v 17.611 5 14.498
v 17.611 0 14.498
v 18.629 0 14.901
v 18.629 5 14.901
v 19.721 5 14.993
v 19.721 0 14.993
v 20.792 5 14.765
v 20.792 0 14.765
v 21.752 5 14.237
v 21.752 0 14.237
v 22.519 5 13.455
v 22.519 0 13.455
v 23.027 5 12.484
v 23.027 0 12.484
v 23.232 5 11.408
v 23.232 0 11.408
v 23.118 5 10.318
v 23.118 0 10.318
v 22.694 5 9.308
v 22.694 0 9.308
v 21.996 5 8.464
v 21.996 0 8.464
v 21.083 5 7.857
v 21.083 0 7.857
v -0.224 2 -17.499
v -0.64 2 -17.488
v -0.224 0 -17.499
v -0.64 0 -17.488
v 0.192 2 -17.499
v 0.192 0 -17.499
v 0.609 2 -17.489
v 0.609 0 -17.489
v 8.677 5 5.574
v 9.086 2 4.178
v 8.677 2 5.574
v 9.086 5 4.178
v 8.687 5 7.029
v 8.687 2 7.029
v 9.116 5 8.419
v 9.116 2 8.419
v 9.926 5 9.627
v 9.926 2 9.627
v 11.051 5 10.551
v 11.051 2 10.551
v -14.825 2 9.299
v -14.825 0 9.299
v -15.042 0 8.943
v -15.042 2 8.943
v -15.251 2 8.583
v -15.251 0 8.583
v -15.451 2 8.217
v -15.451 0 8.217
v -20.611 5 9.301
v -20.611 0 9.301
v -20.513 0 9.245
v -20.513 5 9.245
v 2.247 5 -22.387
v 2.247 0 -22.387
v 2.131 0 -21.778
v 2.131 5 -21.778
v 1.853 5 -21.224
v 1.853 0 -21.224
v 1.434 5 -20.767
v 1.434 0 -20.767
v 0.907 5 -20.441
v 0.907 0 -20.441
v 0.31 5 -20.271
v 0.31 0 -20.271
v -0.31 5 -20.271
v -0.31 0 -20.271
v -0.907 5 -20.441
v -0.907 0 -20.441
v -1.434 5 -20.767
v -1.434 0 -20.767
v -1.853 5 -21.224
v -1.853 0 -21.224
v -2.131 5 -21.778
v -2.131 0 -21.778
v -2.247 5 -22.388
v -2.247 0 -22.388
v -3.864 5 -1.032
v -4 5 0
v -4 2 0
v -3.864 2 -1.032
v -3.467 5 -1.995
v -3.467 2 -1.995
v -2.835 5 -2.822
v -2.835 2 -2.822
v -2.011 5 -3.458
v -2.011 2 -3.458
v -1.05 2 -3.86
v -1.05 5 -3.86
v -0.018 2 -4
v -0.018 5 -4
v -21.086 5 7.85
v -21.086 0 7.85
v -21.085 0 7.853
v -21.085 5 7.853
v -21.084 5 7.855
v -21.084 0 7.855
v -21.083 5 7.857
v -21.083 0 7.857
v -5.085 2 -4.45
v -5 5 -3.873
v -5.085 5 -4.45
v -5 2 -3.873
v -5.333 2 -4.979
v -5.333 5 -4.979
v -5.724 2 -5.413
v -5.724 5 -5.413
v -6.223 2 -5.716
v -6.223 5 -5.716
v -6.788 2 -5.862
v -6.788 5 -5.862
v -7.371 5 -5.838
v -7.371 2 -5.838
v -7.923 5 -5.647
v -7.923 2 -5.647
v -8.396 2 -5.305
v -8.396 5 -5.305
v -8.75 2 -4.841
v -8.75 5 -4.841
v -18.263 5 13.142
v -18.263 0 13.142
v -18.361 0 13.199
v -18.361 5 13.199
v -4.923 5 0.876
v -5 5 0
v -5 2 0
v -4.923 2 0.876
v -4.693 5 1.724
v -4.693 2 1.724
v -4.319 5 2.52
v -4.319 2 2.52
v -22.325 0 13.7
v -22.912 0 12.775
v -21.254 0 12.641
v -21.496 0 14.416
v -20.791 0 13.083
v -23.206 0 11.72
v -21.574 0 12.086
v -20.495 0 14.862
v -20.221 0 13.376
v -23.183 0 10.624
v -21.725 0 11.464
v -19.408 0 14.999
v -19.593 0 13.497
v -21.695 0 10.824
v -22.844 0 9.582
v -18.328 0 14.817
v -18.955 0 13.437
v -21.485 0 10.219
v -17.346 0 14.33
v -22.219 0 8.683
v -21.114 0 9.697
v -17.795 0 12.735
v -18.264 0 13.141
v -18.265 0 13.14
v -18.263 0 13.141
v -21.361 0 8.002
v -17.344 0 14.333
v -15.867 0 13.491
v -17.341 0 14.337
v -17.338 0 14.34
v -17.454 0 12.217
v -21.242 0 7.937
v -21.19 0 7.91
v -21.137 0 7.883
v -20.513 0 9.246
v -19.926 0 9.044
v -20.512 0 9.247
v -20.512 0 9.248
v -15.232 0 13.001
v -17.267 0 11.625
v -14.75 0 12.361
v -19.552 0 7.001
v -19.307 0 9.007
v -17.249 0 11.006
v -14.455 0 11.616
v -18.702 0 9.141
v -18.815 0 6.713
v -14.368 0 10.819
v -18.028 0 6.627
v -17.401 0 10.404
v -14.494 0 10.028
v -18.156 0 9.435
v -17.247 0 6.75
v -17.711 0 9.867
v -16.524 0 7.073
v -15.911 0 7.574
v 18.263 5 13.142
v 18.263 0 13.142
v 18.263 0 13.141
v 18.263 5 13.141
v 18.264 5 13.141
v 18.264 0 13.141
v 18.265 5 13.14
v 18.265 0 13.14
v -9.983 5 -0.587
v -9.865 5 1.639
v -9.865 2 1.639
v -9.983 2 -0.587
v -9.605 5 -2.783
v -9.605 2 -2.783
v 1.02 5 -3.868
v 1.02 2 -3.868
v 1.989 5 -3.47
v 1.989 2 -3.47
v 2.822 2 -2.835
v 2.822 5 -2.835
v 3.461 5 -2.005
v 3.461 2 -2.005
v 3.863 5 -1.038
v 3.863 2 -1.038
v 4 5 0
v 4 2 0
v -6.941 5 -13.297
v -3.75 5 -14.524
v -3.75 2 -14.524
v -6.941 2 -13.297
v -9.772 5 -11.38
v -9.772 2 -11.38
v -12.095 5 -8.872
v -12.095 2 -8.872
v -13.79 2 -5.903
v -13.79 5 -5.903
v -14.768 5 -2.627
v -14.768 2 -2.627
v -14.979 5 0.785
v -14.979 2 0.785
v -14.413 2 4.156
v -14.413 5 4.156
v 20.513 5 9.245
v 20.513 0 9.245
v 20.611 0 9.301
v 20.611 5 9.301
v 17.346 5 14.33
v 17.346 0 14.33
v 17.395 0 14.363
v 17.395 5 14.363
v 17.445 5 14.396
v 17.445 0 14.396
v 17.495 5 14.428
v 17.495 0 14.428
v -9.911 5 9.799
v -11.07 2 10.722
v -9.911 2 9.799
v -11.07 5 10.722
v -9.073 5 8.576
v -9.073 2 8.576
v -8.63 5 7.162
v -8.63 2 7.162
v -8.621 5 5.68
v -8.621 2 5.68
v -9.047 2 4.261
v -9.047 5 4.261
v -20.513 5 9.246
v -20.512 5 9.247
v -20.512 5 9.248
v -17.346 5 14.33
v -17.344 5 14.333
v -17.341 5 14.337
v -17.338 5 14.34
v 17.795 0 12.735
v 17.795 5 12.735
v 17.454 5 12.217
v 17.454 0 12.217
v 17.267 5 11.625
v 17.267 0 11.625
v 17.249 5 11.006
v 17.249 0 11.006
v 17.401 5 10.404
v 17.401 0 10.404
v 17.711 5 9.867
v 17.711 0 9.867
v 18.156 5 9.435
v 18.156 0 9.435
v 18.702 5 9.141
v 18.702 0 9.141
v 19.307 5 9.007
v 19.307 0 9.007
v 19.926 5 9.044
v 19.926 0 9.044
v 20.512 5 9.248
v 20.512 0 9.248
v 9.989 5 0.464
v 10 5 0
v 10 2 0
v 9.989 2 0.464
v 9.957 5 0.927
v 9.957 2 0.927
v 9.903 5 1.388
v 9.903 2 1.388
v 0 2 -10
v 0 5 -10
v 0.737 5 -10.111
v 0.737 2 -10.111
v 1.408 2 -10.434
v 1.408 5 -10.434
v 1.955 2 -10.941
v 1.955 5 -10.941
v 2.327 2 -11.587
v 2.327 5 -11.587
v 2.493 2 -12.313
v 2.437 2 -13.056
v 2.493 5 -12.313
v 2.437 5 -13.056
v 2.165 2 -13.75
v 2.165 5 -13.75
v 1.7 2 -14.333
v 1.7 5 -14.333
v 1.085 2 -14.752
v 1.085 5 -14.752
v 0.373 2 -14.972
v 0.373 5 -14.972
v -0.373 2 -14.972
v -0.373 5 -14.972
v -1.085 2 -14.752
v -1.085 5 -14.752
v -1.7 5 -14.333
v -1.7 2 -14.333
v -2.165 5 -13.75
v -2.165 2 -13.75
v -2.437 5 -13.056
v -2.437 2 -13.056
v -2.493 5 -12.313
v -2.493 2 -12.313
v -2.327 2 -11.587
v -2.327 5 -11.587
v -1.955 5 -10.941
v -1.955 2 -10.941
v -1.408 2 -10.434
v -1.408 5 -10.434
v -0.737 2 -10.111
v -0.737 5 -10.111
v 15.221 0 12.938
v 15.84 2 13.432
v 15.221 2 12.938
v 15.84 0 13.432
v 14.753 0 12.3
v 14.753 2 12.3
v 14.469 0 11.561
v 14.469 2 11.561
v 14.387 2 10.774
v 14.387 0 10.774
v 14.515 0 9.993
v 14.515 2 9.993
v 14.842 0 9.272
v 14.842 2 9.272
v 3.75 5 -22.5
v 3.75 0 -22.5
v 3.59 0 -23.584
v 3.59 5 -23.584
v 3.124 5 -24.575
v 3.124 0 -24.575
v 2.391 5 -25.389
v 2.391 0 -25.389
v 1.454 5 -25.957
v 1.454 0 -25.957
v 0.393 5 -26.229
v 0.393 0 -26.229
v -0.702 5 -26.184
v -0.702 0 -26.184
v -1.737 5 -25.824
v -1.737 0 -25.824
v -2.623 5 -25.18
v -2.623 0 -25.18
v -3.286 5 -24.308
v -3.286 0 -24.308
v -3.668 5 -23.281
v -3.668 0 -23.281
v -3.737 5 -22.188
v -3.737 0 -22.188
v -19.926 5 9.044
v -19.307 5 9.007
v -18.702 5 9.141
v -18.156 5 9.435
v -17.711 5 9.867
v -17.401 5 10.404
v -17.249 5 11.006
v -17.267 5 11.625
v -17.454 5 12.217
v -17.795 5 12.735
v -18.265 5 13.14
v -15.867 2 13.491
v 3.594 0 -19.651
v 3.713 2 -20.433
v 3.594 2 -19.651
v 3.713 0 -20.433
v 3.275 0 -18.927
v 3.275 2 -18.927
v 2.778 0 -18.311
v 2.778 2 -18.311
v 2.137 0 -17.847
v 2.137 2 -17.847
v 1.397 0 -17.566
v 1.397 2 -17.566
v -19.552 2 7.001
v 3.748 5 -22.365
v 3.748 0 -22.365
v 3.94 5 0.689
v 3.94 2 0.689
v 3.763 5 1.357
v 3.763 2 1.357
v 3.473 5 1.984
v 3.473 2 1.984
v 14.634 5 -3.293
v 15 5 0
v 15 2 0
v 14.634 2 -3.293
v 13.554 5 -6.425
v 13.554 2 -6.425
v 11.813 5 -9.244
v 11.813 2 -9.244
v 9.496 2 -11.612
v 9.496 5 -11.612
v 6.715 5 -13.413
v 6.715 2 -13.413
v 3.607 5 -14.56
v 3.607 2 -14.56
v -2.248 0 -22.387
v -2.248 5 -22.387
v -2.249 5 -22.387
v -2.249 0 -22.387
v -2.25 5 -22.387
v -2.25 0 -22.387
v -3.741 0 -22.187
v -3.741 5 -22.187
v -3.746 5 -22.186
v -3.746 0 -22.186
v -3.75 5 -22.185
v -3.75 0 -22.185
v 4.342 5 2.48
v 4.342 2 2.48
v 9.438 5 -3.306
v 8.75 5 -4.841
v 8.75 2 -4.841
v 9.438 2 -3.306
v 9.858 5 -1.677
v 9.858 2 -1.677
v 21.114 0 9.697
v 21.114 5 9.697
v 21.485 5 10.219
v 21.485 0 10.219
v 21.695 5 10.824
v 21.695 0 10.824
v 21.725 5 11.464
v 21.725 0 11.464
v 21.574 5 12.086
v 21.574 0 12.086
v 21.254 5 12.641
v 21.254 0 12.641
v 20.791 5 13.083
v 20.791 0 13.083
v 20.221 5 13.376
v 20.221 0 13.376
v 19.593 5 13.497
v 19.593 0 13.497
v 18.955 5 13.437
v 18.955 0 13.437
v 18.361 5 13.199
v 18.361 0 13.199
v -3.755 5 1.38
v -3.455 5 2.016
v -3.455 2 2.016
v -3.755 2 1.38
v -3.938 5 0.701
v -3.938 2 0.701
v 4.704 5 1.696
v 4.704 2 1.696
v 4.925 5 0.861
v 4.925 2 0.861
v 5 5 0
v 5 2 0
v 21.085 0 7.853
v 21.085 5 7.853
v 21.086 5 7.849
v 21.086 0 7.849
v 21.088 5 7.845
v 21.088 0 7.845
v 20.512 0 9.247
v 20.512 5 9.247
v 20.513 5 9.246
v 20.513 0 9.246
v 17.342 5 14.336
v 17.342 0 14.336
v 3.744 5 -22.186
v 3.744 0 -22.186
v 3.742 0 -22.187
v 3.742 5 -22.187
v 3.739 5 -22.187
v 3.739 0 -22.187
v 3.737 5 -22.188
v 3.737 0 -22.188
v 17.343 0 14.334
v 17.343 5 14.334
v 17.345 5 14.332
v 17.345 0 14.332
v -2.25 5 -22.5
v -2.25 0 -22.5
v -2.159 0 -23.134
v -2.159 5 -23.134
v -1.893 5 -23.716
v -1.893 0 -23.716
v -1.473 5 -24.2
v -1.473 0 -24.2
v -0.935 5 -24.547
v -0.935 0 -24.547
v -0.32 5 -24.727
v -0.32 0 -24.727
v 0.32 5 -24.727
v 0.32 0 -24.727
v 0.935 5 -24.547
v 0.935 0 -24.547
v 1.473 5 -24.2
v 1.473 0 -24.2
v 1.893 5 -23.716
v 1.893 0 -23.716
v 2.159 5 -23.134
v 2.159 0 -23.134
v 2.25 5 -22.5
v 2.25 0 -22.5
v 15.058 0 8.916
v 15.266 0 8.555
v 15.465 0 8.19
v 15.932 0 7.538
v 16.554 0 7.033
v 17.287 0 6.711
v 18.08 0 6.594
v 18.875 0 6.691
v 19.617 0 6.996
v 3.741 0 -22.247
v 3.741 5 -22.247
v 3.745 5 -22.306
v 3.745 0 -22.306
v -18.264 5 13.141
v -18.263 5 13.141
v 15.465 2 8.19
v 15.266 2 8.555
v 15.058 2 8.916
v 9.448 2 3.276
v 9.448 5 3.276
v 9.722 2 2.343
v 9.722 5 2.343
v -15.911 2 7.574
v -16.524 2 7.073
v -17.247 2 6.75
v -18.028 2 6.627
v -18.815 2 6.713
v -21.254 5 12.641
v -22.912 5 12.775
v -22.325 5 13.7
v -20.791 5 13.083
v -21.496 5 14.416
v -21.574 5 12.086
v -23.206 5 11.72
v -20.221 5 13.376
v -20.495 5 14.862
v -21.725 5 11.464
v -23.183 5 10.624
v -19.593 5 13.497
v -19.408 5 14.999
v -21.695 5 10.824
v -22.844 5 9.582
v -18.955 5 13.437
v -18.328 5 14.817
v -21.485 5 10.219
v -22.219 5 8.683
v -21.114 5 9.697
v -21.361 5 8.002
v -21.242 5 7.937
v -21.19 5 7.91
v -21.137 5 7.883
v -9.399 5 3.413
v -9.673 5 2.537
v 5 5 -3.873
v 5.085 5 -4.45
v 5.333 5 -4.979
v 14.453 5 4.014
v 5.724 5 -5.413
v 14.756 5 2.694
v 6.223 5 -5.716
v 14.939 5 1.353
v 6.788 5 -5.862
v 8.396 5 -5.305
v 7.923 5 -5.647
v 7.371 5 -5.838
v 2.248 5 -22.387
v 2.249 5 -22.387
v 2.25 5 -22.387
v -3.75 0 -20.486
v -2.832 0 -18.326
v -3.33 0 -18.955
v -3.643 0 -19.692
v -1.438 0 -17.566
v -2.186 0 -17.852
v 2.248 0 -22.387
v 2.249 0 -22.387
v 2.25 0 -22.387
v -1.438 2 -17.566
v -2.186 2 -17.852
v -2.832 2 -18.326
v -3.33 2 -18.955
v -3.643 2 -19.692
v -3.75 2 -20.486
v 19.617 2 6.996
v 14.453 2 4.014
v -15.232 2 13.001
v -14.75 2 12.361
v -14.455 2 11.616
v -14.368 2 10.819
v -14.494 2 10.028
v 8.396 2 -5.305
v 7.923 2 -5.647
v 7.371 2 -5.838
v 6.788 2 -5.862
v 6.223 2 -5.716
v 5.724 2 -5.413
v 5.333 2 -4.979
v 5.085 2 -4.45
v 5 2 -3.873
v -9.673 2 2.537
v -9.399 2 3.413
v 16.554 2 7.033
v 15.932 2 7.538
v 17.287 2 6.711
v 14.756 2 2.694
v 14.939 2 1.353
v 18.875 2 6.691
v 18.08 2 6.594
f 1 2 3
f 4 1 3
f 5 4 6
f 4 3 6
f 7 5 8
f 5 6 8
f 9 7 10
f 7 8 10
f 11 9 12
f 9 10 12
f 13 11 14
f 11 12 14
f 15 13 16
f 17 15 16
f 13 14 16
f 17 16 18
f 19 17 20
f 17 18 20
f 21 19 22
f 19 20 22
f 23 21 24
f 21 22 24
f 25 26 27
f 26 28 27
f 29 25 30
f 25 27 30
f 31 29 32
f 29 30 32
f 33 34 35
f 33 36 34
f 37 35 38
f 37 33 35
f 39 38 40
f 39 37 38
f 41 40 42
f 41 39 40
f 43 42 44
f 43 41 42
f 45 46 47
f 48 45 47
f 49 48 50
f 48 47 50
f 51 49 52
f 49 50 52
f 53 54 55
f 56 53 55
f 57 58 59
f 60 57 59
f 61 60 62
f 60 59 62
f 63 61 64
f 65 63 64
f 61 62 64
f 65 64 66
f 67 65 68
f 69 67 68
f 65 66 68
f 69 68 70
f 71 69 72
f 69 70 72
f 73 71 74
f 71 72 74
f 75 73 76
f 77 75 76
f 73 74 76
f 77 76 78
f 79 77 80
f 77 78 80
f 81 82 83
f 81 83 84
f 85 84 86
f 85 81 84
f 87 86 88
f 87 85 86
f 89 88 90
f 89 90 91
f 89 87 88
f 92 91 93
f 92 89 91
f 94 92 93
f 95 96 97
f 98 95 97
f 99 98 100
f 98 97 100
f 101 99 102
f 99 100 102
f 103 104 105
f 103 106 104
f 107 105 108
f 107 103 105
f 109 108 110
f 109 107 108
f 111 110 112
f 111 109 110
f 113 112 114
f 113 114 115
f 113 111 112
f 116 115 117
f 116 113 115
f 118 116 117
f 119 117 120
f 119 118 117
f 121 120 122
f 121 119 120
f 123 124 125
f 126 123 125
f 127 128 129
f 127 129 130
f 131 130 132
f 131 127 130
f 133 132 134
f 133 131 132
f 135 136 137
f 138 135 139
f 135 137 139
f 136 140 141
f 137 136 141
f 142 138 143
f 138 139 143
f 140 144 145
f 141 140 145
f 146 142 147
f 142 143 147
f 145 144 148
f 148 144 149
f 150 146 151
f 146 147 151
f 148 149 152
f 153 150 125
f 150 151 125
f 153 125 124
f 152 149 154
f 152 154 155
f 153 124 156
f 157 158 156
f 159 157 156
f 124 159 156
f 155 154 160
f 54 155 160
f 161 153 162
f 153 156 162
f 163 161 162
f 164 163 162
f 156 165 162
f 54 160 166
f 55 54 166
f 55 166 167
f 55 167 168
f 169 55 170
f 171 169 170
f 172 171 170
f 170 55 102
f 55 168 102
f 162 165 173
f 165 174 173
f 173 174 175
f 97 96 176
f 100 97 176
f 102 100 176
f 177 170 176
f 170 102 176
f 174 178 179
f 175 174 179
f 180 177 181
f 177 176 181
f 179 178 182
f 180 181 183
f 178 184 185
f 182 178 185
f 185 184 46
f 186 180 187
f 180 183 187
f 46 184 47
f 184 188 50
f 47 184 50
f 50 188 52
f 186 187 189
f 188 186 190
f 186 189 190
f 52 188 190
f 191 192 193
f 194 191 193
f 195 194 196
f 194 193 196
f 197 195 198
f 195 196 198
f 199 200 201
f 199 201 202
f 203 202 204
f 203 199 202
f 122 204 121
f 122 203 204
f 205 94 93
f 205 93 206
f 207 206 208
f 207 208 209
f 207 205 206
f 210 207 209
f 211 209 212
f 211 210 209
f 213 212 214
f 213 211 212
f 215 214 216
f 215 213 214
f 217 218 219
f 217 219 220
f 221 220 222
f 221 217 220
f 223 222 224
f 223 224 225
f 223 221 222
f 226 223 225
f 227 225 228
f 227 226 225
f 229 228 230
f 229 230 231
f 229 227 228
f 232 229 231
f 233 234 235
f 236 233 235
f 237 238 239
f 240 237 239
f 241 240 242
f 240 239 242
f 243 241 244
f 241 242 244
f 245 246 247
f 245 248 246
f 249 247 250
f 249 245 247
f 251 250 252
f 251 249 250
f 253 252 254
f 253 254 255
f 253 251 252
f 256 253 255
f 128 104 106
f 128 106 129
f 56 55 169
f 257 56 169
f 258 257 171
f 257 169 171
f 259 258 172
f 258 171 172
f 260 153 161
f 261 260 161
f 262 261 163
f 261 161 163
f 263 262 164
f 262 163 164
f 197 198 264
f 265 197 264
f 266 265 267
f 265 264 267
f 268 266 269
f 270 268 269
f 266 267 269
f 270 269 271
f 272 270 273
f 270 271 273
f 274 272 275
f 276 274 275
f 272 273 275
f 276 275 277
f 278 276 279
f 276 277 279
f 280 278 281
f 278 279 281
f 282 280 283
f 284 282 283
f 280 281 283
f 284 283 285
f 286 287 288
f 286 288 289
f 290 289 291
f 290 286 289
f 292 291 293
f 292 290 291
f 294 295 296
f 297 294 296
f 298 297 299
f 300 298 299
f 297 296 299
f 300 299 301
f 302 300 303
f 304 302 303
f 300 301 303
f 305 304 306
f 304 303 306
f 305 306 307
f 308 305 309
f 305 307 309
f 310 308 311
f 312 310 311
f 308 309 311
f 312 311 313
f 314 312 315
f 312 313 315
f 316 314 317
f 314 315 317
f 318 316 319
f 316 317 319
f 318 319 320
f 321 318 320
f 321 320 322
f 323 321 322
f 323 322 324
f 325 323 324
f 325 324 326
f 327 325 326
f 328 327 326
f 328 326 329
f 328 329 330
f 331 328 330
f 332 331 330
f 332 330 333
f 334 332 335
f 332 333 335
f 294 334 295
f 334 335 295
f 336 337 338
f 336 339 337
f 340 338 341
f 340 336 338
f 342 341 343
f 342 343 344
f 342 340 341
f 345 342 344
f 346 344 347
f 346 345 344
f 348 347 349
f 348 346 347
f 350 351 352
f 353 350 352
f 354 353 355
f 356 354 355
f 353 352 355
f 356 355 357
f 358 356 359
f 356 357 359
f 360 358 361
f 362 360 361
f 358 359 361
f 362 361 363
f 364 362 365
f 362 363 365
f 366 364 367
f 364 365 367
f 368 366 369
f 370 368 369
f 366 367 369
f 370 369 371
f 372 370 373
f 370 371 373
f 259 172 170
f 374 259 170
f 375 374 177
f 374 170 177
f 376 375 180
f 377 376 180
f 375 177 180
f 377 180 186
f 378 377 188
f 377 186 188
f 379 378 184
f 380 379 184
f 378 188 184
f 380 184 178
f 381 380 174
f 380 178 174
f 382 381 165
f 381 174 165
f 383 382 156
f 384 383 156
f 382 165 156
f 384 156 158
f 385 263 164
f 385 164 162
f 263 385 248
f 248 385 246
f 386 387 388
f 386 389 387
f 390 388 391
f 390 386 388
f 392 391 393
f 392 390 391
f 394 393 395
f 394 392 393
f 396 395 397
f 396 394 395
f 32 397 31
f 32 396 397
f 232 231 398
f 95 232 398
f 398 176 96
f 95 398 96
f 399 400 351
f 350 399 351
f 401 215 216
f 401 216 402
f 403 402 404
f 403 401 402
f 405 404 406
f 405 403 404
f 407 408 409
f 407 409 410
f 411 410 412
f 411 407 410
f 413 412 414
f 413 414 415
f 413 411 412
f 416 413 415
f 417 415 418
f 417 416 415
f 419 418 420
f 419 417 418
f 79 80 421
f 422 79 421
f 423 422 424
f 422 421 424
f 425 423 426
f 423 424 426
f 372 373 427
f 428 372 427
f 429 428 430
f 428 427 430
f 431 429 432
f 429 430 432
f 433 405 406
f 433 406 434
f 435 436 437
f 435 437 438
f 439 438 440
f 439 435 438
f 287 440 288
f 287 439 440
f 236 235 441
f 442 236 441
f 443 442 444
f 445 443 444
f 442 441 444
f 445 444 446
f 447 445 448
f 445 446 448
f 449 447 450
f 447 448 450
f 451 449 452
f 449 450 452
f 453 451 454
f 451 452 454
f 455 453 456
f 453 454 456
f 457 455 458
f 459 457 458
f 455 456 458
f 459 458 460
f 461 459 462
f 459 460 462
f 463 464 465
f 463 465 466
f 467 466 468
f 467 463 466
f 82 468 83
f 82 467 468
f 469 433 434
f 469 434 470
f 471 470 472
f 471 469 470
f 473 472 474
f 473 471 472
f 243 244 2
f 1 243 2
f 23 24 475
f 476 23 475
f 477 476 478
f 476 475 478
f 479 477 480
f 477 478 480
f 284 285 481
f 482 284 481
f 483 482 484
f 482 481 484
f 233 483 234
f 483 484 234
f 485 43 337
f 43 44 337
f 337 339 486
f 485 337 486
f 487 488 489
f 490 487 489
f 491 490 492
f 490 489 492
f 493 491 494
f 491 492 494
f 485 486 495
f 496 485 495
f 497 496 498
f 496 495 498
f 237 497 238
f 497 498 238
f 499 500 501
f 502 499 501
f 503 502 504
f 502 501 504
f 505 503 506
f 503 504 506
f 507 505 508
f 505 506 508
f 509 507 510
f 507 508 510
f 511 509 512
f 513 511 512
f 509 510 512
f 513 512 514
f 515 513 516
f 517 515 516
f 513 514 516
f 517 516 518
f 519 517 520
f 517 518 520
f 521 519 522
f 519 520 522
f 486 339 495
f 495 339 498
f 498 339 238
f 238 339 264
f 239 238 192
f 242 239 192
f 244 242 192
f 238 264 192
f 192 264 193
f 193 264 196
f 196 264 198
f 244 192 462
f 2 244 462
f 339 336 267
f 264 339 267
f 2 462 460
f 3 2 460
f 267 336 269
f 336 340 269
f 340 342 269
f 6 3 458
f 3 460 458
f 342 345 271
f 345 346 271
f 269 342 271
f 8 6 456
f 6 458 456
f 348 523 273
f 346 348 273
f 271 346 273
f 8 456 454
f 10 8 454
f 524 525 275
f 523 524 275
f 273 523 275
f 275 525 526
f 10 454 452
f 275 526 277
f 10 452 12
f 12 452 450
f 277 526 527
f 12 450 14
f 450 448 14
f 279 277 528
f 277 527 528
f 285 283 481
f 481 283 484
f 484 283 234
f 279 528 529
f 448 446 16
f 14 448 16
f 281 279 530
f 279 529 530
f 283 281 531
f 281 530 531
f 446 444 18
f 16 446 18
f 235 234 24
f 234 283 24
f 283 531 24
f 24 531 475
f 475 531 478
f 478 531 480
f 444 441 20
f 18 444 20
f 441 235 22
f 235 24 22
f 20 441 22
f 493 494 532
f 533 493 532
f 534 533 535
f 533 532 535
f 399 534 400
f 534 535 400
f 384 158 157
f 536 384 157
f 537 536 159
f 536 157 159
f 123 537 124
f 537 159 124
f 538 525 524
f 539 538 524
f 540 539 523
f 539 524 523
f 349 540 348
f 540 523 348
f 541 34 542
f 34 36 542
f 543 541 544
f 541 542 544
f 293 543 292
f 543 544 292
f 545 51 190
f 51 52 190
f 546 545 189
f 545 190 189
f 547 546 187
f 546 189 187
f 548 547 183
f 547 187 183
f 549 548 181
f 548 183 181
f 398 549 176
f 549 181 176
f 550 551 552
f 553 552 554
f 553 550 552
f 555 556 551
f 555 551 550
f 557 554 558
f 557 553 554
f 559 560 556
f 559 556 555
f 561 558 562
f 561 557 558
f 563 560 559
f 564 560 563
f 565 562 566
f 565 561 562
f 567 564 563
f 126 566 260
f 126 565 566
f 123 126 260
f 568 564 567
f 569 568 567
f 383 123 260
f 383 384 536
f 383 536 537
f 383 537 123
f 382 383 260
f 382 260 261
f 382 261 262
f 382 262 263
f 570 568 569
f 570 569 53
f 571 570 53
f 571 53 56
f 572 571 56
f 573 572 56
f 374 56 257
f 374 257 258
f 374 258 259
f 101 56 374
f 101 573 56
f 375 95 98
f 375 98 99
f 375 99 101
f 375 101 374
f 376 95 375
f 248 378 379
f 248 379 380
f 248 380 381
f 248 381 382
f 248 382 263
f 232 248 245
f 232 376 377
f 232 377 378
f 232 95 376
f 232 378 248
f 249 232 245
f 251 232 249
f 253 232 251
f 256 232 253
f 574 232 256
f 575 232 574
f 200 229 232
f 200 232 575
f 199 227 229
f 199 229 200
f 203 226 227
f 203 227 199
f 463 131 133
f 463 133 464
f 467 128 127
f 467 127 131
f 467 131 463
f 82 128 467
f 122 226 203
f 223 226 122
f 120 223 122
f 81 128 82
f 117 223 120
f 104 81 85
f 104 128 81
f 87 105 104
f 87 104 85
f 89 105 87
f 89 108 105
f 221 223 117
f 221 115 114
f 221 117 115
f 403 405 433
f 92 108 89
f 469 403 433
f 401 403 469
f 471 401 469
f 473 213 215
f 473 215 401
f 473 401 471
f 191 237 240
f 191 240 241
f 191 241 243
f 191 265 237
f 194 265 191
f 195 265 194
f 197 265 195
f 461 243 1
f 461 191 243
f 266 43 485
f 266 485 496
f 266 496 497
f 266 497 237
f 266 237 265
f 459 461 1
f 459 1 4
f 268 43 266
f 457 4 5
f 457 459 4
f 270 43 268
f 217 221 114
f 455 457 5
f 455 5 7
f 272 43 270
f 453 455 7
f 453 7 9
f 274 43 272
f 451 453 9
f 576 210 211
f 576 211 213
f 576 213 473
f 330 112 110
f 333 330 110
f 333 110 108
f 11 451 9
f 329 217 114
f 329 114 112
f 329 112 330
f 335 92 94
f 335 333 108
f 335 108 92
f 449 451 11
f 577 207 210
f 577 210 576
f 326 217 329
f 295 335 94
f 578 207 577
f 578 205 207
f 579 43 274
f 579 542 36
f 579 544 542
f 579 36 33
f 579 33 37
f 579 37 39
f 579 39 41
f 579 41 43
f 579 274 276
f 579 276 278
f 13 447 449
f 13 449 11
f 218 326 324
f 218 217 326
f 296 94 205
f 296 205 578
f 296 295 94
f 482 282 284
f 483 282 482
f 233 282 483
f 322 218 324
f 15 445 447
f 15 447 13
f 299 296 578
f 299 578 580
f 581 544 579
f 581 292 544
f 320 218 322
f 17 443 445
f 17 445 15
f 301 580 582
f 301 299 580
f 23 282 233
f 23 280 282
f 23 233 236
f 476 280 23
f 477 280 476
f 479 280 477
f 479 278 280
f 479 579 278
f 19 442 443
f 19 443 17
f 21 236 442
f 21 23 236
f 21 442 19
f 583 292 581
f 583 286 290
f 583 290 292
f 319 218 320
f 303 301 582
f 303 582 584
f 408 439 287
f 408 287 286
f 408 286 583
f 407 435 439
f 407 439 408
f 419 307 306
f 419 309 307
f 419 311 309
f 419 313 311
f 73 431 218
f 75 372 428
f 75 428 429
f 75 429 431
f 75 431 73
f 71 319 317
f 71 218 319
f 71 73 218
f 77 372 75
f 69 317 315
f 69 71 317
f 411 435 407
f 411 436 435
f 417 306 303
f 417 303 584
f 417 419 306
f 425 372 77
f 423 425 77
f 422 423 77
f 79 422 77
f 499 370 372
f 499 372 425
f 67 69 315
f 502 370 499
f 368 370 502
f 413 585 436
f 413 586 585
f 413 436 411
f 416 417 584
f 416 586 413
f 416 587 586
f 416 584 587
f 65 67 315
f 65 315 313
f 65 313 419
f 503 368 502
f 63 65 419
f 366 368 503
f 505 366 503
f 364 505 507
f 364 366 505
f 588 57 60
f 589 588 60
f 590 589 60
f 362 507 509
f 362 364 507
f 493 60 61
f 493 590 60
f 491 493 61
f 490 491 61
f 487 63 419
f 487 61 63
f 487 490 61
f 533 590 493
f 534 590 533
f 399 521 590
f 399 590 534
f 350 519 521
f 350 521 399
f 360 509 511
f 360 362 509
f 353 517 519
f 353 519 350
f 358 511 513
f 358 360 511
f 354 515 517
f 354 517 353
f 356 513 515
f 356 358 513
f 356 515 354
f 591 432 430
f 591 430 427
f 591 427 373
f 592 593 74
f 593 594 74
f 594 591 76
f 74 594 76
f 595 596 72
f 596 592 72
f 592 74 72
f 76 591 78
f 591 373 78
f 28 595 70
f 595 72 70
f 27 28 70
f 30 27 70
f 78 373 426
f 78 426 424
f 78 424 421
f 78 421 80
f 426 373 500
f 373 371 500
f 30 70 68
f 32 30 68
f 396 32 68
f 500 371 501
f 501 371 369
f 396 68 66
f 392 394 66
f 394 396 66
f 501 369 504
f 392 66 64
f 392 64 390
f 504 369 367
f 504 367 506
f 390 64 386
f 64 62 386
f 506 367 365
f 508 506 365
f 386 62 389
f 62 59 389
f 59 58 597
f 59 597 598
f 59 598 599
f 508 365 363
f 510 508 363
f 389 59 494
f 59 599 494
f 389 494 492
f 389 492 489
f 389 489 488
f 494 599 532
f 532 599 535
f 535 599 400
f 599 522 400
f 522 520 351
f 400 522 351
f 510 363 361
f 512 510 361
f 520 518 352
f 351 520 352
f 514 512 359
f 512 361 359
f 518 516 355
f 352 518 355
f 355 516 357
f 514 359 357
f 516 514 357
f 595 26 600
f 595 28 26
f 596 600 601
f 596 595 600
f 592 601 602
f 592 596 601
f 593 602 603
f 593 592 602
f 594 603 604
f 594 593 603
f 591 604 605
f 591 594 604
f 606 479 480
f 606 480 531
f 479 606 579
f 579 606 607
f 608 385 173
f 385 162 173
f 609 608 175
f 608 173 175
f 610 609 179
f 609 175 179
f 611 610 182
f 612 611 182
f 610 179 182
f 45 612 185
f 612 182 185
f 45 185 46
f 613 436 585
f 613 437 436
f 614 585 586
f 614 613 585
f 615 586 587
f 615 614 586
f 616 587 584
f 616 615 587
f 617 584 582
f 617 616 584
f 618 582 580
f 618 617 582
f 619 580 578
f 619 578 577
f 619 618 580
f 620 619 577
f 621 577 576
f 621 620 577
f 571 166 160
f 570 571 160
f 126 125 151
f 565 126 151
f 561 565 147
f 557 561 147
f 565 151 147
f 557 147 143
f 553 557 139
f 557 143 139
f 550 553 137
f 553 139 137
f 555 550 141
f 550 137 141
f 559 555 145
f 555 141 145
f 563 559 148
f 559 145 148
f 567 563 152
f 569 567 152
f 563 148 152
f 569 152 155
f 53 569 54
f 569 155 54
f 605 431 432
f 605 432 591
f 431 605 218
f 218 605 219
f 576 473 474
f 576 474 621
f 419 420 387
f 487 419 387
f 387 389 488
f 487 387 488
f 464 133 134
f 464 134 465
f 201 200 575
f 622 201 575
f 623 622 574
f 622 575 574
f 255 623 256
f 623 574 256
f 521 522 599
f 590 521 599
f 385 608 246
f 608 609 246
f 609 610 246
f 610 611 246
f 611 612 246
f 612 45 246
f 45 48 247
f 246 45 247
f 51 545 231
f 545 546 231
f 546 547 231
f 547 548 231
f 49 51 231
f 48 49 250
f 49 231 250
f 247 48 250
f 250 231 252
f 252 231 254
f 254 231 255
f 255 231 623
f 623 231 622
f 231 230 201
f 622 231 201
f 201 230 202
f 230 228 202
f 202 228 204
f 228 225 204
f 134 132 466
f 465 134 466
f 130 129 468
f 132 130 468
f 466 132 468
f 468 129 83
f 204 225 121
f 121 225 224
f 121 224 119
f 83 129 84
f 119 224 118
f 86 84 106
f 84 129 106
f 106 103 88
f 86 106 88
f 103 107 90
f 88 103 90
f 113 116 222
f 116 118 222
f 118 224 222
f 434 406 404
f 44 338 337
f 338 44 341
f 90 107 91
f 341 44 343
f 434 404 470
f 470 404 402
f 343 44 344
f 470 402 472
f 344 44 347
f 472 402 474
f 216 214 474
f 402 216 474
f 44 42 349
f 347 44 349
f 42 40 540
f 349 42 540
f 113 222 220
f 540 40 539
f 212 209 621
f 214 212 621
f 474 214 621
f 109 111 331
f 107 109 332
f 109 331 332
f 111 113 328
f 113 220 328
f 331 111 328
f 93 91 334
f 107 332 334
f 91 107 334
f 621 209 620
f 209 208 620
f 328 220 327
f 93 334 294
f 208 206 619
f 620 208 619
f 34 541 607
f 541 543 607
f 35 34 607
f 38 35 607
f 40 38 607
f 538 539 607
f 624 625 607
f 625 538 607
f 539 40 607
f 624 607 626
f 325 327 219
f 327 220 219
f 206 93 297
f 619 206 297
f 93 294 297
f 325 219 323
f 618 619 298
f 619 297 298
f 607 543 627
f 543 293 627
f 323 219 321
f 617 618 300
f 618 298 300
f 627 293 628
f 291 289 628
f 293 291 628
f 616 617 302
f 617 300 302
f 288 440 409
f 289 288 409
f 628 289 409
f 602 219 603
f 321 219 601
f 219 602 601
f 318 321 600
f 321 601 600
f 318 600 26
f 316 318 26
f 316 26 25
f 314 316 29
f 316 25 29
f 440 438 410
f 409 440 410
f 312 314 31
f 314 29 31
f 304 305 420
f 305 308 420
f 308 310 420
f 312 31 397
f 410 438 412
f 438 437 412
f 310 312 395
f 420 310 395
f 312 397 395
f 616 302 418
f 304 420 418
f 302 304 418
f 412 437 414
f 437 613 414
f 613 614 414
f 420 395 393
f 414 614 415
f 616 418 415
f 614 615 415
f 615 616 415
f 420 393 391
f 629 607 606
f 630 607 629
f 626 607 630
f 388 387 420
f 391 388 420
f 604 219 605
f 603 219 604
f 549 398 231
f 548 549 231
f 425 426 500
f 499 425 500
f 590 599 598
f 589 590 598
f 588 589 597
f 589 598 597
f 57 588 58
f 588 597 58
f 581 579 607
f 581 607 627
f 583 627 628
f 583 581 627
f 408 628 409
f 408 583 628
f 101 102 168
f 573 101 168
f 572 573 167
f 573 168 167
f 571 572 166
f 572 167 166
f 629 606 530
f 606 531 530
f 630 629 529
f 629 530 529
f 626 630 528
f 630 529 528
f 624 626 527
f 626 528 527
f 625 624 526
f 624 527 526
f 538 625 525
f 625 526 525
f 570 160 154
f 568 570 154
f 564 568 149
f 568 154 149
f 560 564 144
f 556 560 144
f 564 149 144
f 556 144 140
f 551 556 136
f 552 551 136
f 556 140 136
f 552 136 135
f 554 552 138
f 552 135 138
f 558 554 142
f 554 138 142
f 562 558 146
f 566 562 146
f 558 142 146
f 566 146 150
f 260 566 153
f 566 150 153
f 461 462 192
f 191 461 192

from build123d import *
from build123d.topology import SkipClean

# Parameters (mm, degrees)
EXTRUDE_1_DEPTH     = 5
SKETCH_2_R          = 17.5
CUT_EXTRUDE_1_DEPTH = 2
FILLET_1_R          = 3
EXTRUDE_2_DEPTH     = 3
SKETCH_4_R          = 10
CUT_EXTRUDE_2_DEPTH = 3
FILLET_2_R          = 5
EXTRUDE_3_DEPTH     = 3
FILLET_3_R          = 2
SKETCH_6_R          = 2.5
CUT_EXTRUDE_3_DEPTH = 3


with BuildPart() as part:
    # 草图1 → 凸台-拉伸1 (new body)
    with BuildSketch(Plane(origin=(0, 0, 0), x_dir=(1, 0, 0), z_dir=(0, 1, 0))):
        with BuildLine():
            Line((-17.338032686, -14.340244858), (0.36317955, -4.120445208))
            Line((0.36317955, -4.120445208), (17.341691759, -14.335819716))
            ThreePointArc((17.341691759, -14.335819716), (17.344076322, -14.33293468), (17.346460405, -14.330049246))
            ThreePointArc((17.346460405, -14.330049246), (17.419960834, -14.379816644), (17.494618607, -14.42783043))
            Line((17.494618607, -14.42783043), (17.610571585, -14.497595264))
            ThreePointArc((17.610571585, -14.497595264), (22.80853464, -12.987934561), (21.083416888, -7.857450754))
            ThreePointArc((21.083416888, -7.857450754), (21.085725698, -7.851252881), (21.088032686, -7.845054329))
            Line((21.088032686, -7.845054329), (3.38682045, 2.374745321))
            Line((3.38682045, 2.374745321), (3.744338179, 22.186255466))
            ThreePointArc((3.744338179, 22.186255466), (3.740647382, 22.18687804), (3.736956482, 22.1875))
            ThreePointArc((3.736956482, 22.1875), (3.743306098, 22.276036937), (3.74755837, 22.364699358))
            Line((3.74755837, 22.364699358), (3.75, 22.5))
            ThreePointArc((3.75, 22.5), (-0.156386047, 26.246737702), (-3.736956482, 22.1875))
            ThreePointArc((-3.736956482, 22.1875), (-3.743478403, 22.186400552), (-3.75, 22.185299187))
            Line((-3.75, 22.185299187), (-3.75, 1.745699887))
            Line((-3.75, 1.745699887), (-21.086029938, -7.85043575))
            ThreePointArc((-21.086029938, -7.85043575), (-21.084723704, -7.85394336), (-21.083416888, -7.857450754))
            ThreePointArc((-21.083416888, -7.857450754), (-21.163266932, -7.896220293), (-21.242176977, -7.936868928))
            Line((-21.242176977, -7.936868928), (-21.360571585, -8.002404736))
            ThreePointArc((-21.360571585, -8.002404736), (-22.652148592, -13.258803141), (-17.346460405, -14.330049246))
            ThreePointArc((-17.346460405, -14.330049246), (-17.342247295, -14.335147671), (-17.338032686, -14.340244858))
        make_face()
        with BuildLine():
            ThreePointArc((-18.264550857, -13.139869938), (-18.263724931, -13.141017908), (-18.262898932, -13.142165826))
            Line((-18.262898932, -13.142165826), (-18.360571585, -13.198557159))
            ThreePointArc((-18.360571585, -13.198557159), (-21.434128744, -12.375), (-20.610571585, -9.301442841))
            Line((-20.610571585, -9.301442841), (-20.512898932, -9.245051509))
            ThreePointArc((-20.512898932, -9.245051509), (-20.512317805, -9.246340804), (-20.511736597, -9.247630062))
            ThreePointArc((-20.511736597, -9.247630062), (-17.537014427, -10.125), (-18.264550857, -13.139869938))
        make_face(mode=Mode.SUBTRACT)
        with BuildLine():
            ThreePointArc((20.511736597, -9.247630062), (20.512317805, -9.246340804), (20.512898932, -9.245051509))
            Line((20.512898932, -9.245051509), (20.610571585, -9.301442841))
            ThreePointArc((20.610571585, -9.301442841), (21.434128744, -12.375), (18.360571585, -13.198557159))
            Line((18.360571585, -13.198557159), (18.262898932, -13.142165826))
            ThreePointArc((18.262898932, -13.142165826), (18.263724931, -13.141017908), (18.264550857, -13.139869938))
            ThreePointArc((18.264550857, -13.139869938), (17.537014427, -10.125), (20.511736597, -9.247630062))
        make_face(mode=Mode.SUBTRACT)
        with BuildLine():
            Line((-2.25, 22.387217335), (-2.25, 22.5))
            ThreePointArc((-2.25, 22.5), (0, 24.75), (2.25, 22.5))
            Line((2.25, 22.5), (2.25, 22.387217335))
            ThreePointArc((2.25, 22.387217335), (2.248592874, 22.387358712), (2.24718574, 22.3875))
            ThreePointArc((2.24718574, 22.3875), (0, 20.25), (-2.24718574, 22.3875))
            ThreePointArc((-2.24718574, 22.3875), (-2.248592874, 22.387358712), (-2.25, 22.387217335))
        make_face(mode=Mode.SUBTRACT)
    extrude(amount=EXTRUDE_1_DEPTH)

    # 草图2 → 切除-拉伸1 (cut)
    with BuildSketch(Plane.XZ):
        Circle(SKETCH_2_R)
    extrude(amount=-CUT_EXTRUDE_1_DEPTH, mode=Mode.SUBTRACT)

    # 圆角1
    fillet_1_edges = [part.edges().sort_by_distance(p)[0] for p in [
        (-12.928399103, 1, 11.794341721),
        (12.995206069, 1, 11.720691926),
        (16.678399103, 1, 5.299151193),
        (3.652813923, 1, -17.114524546),
        (-3.75, 1, -17.093492914),
        (-16.648019992, 1, 5.393832621),
    ]]
    fillet(fillet_1_edges, radius=FILLET_1_R)

    # 草图3 → 凸台-拉伸2 (add)
    with BuildSketch(Plane(origin=(0, 5, 0), x_dir=(1, 0, 0), z_dir=(0, 1, 0))):
        with BuildLine():
            Line((9.903270362, -1.38752879), (14.452882373, -4.01424851))
            ThreePointArc((14.452882373, -4.01424851), (14.862591221, -2.025680676), (15, 0))
            ThreePointArc((15, 0), (11.813143266, 9.24389778), (3.606713844, 14.559931842))
            Line((3.606713844, 14.559931842), (3.512924046, 9.362657991))
            ThreePointArc((3.512924046, 9.362657991), (8.219770084, 5.695206737), (10, 0))
            ThreePointArc((10, 0), (9.97578828, -0.695448195), (9.903270362, -1.38752879))
        make_face()
        with BuildLine():
            ThreePointArc((-3.75, 14.523687548), (-13.027173179, 7.435910097), (-14.412627775, -4.156460108))
            Line((-14.412627775, -4.156460108), (-9.86476169, -1.63904753))
            ThreePointArc((-9.86476169, -1.63904753), (-8.723165526, 4.889415425), (-3.75, 9.270248109))
            Line((-3.75, 9.270248109), (-3.75, 14.523687548))
        make_face()
    extrude(amount=-EXTRUDE_2_DEPTH)

    # 草图4 → 切除-拉伸2 (cut)
    with SkipClean():  # the faces are left unmerged after this step: merging them gives an invalid solid
        with BuildSketch(Plane(origin=(0, 5, 0), x_dir=(1, 0, 0), z_dir=(0, 1, 0))):
            Circle(SKETCH_4_R)
        extrude(amount=-CUT_EXTRUDE_2_DEPTH, mode=Mode.SUBTRACT)

    # 圆角2
    fillet_2_edges = [part.edges().sort_by_distance(p)[0] for p in [
        (-6.153270362, 3.5, 7.882719319),
        (6.351837644, 3.5, 7.72361046),
    ]]
    fillet(fillet_2_edges, radius=FILLET_2_R)

    # 草图5 → 凸台-拉伸3 (add)
    with SkipClean():  # the faces are left unmerged after this step: merging them gives an invalid solid
        with BuildSketch(Plane(origin=(0, 5, 0), x_dir=(1, 0, 0), z_dir=(0, 1, 0))):
            with BuildLine():
                Line((-4.318593576, -2.519870934), (-3.454874861, -2.015896748))
                ThreePointArc((-3.454874861, -2.015896748), (-3.861314507, -1.044150506), (-4, 0))
                Line((-4, 0), (-4, 3))
                ThreePointArc((-4, 3), (-4.74341649, 1.58113883), (-5, 0))
                ThreePointArc((-5, 0), (-4.826643134, -1.305188132), (-4.318593576, -2.519870934))
            make_face()
            with BuildLine():
                ThreePointArc((-5, 0), (-4.74341649, 1.58113883), (-4, 3))
                Line((-4, 3), (-4, 9.16515139))
                ThreePointArc((-4, 9.16515139), (-4.507075586, 8.926716623), (-5, 8.660254038))
                Line((-5, 8.660254038), (-5, 0))
            make_face()
            with BuildLine():
                ThreePointArc((-4, 3), (-2.246337039, 4.46698667), (-0.022975456, 4.999947213))
                Line((-0.022975456, 4.999947213), (-0.045950911, 9.999894425))
                ThreePointArc((-0.045950911, 9.999894425), (-2.065581922, 9.784343173), (-4, 9.16515139))
                Line((-4, 9.16515139), (-4, 3))
            make_face()
            with BuildLine():
                ThreePointArc((-4, 0), (-2.834918117, 2.821921202), (-0.018380364, 3.99995777))
                Line((-0.018380364, 3.99995777), (-0.022975456, 4.999947213))
                ThreePointArc((-0.022975456, 4.999947213), (-2.246337039, 4.46698667), (-4, 3))
                Line((-4, 3), (-4, 0))
            make_face()
            with BuildLine():
                Line((-0.045950911, 9.999894425), (-0.022975456, 4.999947213))
                ThreePointArc((-0.022975456, 4.999947213), (2.225787112, 4.477261633), (4, 3))
                Line((4, 3), (4, 9.16515139))
                ThreePointArc((4, 9.16515139), (2.020600167, 9.793731412), (-0.045950911, 9.999894425))
            make_face()
            with BuildLine():
                Line((-0.022975456, 4.999947213), (-0.018380364, 3.99995777))
                ThreePointArc((-0.018380364, 3.99995777), (2.821921202, 2.834918117), (4, 0))
                Line((4, 0), (4, 3))
                ThreePointArc((4, 3), (2.225787112, 4.477261633), (-0.022975456, 4.999947213))
            make_face()
            with BuildLine():
                Line((4, 9.16515139), (4, 3))
                ThreePointArc((4, 3), (4.74341649, 1.58113883), (5, 0))
                Line((5, 0), (5, 8.660254038))
                ThreePointArc((5, 8.660254038), (4.507075586, 8.926716623), (4, 9.16515139))
            make_face()
            with BuildLine():
                ThreePointArc((4, 0), (3.866071708, -1.02639639), (3.473255225, -1.984061023))
                Line((3.473255225, -1.984061023), (4.341569031, -2.480076278))
                ThreePointArc((4.341569031, -2.480076278), (4.832589635, -1.282995488), (5, 0))
                ThreePointArc((5, 0), (4.74341649, 1.58113883), (4, 3))
                Line((4, 3), (4, 0))
            make_face()
        extrude(amount=-EXTRUDE_3_DEPTH)

    # 圆角3
    fillet_3_edges = [part.edges().sort_by_distance(p)[0] for p in [
        (-5, 3.5, -8.660254038),
        (5, 3.5, -8.660254038),
    ]]
    fillet(fillet_3_edges, radius=FILLET_3_R)

    # 草图6 → 切除-拉伸3 (cut)
    with SkipClean():  # the faces are left unmerged after this step: merging them gives an invalid solid
        with BuildSketch(Plane(origin=(0, 5, 0), x_dir=(1, 0, 0), z_dir=(0, 1, 0))):
            with Locations(Location((0, 12.5, 0), (0, 0, 270))):
                Circle(SKETCH_6_R)
        extrude(amount=-CUT_EXTRUDE_3_DEPTH, mode=Mode.SUBTRACT)


solid = part.part
